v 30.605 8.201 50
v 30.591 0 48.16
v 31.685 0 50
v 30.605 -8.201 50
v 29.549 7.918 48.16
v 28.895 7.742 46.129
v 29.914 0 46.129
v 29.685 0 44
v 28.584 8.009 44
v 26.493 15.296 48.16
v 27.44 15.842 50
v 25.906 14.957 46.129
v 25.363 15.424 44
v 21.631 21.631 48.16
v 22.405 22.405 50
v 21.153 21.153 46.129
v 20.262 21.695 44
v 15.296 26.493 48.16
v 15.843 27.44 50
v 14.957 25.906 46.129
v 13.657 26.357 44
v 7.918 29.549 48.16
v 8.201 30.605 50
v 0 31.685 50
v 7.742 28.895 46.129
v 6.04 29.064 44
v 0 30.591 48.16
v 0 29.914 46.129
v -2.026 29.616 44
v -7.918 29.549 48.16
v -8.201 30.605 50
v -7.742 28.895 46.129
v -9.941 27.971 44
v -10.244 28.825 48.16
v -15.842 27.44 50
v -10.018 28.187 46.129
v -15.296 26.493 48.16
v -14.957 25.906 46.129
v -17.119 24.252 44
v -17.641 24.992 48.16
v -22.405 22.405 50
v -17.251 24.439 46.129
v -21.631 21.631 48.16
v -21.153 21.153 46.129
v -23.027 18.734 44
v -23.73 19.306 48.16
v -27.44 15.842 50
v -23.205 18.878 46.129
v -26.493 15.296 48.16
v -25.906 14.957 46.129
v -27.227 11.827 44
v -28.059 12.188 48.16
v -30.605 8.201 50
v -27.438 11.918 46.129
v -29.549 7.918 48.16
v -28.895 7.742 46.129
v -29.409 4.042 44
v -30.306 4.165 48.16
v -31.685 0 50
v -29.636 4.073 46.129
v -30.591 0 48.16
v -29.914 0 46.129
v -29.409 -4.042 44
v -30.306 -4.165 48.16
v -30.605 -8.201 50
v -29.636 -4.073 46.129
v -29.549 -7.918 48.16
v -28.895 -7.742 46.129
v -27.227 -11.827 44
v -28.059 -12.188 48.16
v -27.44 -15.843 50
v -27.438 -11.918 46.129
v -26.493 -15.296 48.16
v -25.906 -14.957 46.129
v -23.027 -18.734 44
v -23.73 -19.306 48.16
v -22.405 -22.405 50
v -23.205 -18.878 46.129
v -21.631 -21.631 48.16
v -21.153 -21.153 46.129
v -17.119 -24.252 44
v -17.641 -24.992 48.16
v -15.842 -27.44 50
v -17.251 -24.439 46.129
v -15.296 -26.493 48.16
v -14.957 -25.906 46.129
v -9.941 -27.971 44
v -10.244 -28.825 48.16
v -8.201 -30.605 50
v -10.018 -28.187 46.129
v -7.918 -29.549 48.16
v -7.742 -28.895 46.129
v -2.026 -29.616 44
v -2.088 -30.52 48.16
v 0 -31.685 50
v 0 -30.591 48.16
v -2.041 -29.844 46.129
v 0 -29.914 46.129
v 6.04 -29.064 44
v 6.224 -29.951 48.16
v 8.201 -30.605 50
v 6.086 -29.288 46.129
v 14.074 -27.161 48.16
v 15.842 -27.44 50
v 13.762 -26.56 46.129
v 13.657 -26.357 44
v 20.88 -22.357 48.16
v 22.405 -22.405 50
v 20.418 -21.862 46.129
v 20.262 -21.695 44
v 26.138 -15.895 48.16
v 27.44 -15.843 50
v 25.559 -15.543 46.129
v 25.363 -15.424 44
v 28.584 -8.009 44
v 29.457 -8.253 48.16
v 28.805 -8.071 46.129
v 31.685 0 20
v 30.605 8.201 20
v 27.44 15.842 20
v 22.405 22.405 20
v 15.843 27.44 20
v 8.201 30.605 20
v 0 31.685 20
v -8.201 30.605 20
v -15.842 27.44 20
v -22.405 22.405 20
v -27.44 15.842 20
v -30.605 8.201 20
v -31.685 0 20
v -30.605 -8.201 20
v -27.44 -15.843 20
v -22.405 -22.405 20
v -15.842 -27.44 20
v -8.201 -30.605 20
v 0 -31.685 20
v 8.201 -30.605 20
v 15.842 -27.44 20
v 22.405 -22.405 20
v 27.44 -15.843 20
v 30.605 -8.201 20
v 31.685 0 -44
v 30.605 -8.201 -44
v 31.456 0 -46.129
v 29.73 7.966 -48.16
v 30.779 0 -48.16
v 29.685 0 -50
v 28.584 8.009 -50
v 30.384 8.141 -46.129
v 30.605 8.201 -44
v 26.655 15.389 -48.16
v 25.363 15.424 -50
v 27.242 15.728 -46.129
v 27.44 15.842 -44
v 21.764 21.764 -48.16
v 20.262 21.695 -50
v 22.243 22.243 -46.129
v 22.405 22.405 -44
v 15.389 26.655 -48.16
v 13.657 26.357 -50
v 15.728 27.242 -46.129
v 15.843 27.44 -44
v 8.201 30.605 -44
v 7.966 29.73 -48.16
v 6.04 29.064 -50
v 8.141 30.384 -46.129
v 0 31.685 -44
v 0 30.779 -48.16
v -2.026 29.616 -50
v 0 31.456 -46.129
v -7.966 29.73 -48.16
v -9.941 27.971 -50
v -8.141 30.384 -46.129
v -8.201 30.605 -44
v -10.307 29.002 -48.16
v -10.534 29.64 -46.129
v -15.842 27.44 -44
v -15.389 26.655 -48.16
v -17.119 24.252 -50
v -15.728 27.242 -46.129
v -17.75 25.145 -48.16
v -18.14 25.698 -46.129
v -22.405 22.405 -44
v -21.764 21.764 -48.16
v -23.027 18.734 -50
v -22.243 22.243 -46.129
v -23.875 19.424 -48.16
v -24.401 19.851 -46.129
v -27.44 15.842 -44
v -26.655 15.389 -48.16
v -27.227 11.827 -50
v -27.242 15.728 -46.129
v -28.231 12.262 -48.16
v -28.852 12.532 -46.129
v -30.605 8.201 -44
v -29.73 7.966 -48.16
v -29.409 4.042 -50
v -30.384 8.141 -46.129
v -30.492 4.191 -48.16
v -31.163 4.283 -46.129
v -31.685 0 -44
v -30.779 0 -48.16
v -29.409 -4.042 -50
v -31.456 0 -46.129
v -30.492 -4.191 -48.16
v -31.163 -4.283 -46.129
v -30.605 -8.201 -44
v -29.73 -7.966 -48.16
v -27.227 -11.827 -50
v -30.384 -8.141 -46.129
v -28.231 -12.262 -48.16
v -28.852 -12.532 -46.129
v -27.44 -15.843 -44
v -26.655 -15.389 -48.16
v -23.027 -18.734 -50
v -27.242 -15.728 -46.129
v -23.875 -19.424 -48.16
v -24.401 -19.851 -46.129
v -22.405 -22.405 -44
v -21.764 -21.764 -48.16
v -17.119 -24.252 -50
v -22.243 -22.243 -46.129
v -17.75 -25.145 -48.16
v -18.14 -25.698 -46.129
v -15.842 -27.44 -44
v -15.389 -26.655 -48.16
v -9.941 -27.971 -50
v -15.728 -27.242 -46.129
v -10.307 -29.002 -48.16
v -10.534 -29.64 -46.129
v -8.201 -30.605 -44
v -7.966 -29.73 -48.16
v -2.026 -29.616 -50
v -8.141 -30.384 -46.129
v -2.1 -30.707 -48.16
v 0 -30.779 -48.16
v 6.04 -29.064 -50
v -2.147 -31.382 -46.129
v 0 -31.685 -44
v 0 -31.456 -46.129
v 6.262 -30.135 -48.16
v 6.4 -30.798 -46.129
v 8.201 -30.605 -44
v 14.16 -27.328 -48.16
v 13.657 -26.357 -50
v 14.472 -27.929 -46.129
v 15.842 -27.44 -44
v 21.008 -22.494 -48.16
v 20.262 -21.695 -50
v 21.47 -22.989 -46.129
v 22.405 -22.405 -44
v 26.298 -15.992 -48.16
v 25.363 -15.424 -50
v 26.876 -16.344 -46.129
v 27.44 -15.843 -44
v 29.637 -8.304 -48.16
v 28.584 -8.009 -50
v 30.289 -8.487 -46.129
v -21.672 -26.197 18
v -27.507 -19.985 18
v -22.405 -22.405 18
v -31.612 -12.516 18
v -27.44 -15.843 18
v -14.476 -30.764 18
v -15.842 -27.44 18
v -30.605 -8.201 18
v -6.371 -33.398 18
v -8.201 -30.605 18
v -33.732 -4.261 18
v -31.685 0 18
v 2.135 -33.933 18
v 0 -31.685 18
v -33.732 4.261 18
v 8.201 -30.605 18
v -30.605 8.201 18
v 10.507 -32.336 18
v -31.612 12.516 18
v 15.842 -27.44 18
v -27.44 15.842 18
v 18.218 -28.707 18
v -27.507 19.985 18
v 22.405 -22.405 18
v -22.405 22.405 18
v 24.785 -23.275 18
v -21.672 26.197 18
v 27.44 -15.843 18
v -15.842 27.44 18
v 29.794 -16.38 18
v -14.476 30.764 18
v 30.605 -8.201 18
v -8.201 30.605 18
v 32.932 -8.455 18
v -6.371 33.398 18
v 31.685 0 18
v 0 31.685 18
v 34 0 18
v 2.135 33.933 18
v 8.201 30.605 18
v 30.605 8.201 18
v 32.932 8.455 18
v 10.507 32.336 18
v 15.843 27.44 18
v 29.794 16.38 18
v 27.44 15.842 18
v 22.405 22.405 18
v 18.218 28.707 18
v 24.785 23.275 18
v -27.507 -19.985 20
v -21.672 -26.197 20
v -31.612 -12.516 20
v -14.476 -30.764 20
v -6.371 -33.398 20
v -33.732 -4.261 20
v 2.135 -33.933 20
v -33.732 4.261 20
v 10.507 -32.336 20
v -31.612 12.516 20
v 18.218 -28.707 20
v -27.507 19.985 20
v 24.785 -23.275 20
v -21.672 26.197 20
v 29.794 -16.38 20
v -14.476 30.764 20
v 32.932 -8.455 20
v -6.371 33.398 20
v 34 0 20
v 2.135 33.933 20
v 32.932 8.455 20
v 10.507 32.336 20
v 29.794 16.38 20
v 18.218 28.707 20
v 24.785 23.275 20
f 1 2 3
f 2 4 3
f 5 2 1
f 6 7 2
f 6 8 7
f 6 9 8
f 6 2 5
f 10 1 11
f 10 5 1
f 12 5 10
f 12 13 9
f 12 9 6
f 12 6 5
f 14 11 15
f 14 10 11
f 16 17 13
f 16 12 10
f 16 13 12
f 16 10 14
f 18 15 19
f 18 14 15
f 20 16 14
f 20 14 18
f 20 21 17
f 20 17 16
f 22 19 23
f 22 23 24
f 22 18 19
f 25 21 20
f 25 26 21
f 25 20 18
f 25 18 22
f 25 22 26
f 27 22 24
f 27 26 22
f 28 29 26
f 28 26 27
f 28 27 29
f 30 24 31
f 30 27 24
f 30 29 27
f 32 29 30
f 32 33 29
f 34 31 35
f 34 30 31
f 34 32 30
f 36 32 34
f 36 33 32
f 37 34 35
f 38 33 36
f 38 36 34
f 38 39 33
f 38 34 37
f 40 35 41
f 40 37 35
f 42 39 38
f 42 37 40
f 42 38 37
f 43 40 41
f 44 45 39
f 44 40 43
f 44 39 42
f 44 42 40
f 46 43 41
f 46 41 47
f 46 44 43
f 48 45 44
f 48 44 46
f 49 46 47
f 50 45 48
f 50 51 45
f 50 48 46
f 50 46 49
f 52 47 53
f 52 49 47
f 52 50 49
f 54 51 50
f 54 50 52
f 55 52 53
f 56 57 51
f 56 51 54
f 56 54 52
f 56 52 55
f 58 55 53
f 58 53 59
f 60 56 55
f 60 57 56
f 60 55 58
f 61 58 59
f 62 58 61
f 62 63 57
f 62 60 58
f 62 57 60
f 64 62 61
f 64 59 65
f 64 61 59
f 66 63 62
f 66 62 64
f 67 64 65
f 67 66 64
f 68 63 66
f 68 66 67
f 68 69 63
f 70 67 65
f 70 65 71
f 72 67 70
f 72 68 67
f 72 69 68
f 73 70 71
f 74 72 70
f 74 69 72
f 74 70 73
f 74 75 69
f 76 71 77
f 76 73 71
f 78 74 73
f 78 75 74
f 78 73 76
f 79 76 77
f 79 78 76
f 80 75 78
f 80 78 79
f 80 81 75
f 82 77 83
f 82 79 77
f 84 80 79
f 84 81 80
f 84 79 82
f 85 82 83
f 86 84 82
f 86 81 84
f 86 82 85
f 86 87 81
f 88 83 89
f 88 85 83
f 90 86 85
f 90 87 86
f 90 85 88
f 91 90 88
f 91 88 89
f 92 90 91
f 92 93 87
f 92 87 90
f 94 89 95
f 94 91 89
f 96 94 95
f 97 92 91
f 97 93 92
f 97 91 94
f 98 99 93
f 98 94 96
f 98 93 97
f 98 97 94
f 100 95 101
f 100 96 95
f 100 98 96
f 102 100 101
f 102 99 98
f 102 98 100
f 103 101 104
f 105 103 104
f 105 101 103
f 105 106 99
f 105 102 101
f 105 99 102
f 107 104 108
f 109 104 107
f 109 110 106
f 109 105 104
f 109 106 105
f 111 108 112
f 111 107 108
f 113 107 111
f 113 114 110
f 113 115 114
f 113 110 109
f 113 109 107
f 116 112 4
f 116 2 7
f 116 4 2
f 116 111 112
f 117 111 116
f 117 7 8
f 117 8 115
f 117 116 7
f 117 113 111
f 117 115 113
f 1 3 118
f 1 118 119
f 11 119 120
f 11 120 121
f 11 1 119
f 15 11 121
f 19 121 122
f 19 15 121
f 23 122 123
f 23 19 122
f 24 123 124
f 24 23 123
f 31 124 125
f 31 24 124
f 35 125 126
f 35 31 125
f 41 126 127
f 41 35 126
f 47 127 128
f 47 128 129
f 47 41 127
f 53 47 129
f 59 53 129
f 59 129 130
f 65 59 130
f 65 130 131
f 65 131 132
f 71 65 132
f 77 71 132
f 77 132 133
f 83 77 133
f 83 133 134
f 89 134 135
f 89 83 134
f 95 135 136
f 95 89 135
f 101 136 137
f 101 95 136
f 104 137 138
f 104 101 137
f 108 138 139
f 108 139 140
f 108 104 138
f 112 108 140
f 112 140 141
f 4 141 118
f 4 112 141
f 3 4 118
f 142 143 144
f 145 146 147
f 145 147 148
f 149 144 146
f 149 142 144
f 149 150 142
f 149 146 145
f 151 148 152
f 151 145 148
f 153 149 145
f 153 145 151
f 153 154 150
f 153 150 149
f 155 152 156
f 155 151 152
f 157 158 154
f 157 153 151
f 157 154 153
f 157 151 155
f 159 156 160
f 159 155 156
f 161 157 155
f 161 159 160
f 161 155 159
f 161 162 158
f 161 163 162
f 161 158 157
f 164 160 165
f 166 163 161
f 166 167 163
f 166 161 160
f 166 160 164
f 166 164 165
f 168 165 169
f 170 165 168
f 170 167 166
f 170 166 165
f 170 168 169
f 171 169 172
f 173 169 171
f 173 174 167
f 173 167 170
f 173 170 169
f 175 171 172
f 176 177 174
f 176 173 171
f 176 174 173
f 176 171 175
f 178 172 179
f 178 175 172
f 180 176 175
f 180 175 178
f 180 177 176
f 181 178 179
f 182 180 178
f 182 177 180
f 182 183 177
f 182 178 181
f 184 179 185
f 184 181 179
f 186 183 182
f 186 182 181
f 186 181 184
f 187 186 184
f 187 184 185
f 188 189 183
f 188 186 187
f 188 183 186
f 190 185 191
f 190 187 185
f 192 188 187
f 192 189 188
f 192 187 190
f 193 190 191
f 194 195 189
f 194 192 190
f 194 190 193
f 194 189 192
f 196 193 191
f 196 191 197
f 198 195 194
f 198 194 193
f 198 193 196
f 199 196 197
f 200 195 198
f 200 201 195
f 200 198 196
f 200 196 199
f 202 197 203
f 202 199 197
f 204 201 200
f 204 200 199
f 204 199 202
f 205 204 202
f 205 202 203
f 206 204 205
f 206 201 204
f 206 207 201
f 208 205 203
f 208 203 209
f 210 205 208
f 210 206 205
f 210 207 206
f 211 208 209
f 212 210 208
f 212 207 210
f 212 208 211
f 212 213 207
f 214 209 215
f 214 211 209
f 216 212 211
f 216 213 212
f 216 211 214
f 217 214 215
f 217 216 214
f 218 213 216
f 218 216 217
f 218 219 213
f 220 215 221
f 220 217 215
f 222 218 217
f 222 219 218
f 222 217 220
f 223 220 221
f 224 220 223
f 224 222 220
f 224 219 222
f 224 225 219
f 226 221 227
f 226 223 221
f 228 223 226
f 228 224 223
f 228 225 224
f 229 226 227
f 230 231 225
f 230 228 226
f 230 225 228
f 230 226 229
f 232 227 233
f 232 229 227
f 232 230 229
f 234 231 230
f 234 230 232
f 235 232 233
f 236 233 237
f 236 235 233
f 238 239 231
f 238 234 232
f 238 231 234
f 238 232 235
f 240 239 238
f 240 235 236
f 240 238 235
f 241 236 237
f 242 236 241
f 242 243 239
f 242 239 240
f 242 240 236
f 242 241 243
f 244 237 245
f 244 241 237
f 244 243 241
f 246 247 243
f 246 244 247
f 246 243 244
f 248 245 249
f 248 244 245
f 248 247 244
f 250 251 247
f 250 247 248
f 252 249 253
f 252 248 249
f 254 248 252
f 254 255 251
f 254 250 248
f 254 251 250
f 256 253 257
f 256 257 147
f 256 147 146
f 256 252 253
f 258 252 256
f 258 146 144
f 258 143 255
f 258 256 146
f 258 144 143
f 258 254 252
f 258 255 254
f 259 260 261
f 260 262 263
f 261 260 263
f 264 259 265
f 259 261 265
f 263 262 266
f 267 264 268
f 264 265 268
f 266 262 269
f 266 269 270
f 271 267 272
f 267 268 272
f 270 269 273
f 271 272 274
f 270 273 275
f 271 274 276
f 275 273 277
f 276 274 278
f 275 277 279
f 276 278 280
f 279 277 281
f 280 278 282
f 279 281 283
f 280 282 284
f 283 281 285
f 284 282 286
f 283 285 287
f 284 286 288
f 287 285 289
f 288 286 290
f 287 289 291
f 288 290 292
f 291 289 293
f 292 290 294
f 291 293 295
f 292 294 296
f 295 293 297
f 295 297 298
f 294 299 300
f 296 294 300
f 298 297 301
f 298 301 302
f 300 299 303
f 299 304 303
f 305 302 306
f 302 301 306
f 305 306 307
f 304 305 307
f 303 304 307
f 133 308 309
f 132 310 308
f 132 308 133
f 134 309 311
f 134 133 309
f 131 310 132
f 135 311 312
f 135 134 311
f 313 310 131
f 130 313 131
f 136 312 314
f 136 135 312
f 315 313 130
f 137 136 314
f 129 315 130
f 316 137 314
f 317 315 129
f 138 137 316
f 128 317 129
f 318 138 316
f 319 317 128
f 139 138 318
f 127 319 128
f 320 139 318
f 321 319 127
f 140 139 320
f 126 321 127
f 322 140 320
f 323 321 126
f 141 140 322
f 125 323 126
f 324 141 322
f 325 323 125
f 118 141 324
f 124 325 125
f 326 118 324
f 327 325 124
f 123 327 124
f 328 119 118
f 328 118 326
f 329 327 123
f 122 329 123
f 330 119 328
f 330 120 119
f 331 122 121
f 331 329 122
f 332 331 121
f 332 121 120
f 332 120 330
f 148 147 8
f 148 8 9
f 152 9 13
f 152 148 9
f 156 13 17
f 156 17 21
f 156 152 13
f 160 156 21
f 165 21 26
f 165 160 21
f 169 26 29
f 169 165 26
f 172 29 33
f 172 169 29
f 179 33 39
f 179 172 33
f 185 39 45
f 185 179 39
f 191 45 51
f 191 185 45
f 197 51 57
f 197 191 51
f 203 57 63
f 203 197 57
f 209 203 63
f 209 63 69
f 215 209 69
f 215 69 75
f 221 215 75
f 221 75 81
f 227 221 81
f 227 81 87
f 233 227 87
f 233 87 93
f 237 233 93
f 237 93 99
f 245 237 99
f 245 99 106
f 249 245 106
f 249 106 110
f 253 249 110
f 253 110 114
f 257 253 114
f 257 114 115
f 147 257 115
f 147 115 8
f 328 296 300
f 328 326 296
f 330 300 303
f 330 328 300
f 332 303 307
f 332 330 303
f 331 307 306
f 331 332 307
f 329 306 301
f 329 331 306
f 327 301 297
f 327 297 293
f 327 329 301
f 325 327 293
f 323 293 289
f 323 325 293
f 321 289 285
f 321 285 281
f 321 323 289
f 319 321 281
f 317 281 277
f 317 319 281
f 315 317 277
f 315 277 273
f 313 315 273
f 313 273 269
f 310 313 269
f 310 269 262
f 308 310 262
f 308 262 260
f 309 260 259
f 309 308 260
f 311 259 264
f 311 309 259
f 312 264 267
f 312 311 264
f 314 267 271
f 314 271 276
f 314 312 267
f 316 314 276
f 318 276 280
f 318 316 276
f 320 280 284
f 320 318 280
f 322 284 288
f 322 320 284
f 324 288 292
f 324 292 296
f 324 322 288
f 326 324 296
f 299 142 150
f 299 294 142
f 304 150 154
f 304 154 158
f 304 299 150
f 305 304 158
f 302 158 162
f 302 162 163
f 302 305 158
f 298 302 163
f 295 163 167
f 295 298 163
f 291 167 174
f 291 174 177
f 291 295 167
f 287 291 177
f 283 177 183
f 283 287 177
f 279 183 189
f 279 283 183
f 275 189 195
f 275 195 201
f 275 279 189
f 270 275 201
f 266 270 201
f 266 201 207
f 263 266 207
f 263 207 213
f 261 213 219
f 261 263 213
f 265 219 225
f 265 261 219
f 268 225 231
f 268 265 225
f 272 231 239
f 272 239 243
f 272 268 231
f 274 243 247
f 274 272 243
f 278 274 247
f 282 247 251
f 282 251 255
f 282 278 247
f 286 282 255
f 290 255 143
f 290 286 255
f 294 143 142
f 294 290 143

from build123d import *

# Parameters (mm, degrees)
SKETCH1_R           = 31.685
SKETCH1_R_2         = 29.685
BOSS_EXTRUDE1_DEPTH = 50
SKETCH2_R           = 34
SKETCH2_R_2         = 29.685
BOSS_EXTRUDE2_DEPTH = 1
FILLET1_R           = 10


with BuildPart() as part:
    # Sketch1 → Boss-Extrude1 (new, symmetric)
    with BuildSketch(Plane.XY):
        Circle(SKETCH1_R)
        Circle(SKETCH1_R_2, mode=Mode.SUBTRACT)
    extrude(amount=BOSS_EXTRUDE1_DEPTH, both=True)

    # Sketch2 → Boss-Extrude2 (add, symmetric)
    with BuildSketch(Plane.XY.offset(19)):
        Circle(SKETCH2_R)
        Circle(SKETCH2_R_2, mode=Mode.SUBTRACT)
    extrude(amount=BOSS_EXTRUDE2_DEPTH, both=True)

    # Fillet1
    # the kernel refuses this fillet: 10 mm, written as the material it takes off along each edge
    with BuildSketch(Plane(origin=(0, 0, -50), x_dir=(1, 0, 0), z_dir=(0, -1, 0))) as fillet1_piece_1:
        with BuildLine():
            CenterArc((21.685, 6), FILLET1_R, 323.130102354, 36.869897646)
            Line((29.685, 0), (29.845, -0.12))
            ThreePointArc((29.845, -0.12), (30.685, -0.2), (31.685, -0.2))
            Line((31.685, -0.2), (31.885, 0))
            Line((31.885, 0), (31.885, 6))
            Line((31.885, 6), (31.685, 6))
        make_face()
    revolve(axis=Axis((0, 0, -50), (0, 0, 1)), mode=Mode.SUBTRACT)
    with BuildSketch(Plane(origin=(0, 0, 50), x_dir=(1, 0, 0), z_dir=(0, -1, 0))) as fillet1_piece_2:
        with BuildLine():
            CenterArc((39.685, -6), FILLET1_R, 143.130102354, 36.869897646)
            Line((31.685, 0), (31.525, 0.12))
            ThreePointArc((31.525, 0.12), (30.685, 0.2), (29.685, 0.2))
            Line((29.685, 0.2), (29.485, 0))
            Line((29.485, 0), (29.485, -6))
            Line((29.485, -6), (29.685, -6))
        make_face()
    revolve(axis=Axis((0, 0, 50), (0, 0, 1)), mode=Mode.SUBTRACT)


solid = part.part
